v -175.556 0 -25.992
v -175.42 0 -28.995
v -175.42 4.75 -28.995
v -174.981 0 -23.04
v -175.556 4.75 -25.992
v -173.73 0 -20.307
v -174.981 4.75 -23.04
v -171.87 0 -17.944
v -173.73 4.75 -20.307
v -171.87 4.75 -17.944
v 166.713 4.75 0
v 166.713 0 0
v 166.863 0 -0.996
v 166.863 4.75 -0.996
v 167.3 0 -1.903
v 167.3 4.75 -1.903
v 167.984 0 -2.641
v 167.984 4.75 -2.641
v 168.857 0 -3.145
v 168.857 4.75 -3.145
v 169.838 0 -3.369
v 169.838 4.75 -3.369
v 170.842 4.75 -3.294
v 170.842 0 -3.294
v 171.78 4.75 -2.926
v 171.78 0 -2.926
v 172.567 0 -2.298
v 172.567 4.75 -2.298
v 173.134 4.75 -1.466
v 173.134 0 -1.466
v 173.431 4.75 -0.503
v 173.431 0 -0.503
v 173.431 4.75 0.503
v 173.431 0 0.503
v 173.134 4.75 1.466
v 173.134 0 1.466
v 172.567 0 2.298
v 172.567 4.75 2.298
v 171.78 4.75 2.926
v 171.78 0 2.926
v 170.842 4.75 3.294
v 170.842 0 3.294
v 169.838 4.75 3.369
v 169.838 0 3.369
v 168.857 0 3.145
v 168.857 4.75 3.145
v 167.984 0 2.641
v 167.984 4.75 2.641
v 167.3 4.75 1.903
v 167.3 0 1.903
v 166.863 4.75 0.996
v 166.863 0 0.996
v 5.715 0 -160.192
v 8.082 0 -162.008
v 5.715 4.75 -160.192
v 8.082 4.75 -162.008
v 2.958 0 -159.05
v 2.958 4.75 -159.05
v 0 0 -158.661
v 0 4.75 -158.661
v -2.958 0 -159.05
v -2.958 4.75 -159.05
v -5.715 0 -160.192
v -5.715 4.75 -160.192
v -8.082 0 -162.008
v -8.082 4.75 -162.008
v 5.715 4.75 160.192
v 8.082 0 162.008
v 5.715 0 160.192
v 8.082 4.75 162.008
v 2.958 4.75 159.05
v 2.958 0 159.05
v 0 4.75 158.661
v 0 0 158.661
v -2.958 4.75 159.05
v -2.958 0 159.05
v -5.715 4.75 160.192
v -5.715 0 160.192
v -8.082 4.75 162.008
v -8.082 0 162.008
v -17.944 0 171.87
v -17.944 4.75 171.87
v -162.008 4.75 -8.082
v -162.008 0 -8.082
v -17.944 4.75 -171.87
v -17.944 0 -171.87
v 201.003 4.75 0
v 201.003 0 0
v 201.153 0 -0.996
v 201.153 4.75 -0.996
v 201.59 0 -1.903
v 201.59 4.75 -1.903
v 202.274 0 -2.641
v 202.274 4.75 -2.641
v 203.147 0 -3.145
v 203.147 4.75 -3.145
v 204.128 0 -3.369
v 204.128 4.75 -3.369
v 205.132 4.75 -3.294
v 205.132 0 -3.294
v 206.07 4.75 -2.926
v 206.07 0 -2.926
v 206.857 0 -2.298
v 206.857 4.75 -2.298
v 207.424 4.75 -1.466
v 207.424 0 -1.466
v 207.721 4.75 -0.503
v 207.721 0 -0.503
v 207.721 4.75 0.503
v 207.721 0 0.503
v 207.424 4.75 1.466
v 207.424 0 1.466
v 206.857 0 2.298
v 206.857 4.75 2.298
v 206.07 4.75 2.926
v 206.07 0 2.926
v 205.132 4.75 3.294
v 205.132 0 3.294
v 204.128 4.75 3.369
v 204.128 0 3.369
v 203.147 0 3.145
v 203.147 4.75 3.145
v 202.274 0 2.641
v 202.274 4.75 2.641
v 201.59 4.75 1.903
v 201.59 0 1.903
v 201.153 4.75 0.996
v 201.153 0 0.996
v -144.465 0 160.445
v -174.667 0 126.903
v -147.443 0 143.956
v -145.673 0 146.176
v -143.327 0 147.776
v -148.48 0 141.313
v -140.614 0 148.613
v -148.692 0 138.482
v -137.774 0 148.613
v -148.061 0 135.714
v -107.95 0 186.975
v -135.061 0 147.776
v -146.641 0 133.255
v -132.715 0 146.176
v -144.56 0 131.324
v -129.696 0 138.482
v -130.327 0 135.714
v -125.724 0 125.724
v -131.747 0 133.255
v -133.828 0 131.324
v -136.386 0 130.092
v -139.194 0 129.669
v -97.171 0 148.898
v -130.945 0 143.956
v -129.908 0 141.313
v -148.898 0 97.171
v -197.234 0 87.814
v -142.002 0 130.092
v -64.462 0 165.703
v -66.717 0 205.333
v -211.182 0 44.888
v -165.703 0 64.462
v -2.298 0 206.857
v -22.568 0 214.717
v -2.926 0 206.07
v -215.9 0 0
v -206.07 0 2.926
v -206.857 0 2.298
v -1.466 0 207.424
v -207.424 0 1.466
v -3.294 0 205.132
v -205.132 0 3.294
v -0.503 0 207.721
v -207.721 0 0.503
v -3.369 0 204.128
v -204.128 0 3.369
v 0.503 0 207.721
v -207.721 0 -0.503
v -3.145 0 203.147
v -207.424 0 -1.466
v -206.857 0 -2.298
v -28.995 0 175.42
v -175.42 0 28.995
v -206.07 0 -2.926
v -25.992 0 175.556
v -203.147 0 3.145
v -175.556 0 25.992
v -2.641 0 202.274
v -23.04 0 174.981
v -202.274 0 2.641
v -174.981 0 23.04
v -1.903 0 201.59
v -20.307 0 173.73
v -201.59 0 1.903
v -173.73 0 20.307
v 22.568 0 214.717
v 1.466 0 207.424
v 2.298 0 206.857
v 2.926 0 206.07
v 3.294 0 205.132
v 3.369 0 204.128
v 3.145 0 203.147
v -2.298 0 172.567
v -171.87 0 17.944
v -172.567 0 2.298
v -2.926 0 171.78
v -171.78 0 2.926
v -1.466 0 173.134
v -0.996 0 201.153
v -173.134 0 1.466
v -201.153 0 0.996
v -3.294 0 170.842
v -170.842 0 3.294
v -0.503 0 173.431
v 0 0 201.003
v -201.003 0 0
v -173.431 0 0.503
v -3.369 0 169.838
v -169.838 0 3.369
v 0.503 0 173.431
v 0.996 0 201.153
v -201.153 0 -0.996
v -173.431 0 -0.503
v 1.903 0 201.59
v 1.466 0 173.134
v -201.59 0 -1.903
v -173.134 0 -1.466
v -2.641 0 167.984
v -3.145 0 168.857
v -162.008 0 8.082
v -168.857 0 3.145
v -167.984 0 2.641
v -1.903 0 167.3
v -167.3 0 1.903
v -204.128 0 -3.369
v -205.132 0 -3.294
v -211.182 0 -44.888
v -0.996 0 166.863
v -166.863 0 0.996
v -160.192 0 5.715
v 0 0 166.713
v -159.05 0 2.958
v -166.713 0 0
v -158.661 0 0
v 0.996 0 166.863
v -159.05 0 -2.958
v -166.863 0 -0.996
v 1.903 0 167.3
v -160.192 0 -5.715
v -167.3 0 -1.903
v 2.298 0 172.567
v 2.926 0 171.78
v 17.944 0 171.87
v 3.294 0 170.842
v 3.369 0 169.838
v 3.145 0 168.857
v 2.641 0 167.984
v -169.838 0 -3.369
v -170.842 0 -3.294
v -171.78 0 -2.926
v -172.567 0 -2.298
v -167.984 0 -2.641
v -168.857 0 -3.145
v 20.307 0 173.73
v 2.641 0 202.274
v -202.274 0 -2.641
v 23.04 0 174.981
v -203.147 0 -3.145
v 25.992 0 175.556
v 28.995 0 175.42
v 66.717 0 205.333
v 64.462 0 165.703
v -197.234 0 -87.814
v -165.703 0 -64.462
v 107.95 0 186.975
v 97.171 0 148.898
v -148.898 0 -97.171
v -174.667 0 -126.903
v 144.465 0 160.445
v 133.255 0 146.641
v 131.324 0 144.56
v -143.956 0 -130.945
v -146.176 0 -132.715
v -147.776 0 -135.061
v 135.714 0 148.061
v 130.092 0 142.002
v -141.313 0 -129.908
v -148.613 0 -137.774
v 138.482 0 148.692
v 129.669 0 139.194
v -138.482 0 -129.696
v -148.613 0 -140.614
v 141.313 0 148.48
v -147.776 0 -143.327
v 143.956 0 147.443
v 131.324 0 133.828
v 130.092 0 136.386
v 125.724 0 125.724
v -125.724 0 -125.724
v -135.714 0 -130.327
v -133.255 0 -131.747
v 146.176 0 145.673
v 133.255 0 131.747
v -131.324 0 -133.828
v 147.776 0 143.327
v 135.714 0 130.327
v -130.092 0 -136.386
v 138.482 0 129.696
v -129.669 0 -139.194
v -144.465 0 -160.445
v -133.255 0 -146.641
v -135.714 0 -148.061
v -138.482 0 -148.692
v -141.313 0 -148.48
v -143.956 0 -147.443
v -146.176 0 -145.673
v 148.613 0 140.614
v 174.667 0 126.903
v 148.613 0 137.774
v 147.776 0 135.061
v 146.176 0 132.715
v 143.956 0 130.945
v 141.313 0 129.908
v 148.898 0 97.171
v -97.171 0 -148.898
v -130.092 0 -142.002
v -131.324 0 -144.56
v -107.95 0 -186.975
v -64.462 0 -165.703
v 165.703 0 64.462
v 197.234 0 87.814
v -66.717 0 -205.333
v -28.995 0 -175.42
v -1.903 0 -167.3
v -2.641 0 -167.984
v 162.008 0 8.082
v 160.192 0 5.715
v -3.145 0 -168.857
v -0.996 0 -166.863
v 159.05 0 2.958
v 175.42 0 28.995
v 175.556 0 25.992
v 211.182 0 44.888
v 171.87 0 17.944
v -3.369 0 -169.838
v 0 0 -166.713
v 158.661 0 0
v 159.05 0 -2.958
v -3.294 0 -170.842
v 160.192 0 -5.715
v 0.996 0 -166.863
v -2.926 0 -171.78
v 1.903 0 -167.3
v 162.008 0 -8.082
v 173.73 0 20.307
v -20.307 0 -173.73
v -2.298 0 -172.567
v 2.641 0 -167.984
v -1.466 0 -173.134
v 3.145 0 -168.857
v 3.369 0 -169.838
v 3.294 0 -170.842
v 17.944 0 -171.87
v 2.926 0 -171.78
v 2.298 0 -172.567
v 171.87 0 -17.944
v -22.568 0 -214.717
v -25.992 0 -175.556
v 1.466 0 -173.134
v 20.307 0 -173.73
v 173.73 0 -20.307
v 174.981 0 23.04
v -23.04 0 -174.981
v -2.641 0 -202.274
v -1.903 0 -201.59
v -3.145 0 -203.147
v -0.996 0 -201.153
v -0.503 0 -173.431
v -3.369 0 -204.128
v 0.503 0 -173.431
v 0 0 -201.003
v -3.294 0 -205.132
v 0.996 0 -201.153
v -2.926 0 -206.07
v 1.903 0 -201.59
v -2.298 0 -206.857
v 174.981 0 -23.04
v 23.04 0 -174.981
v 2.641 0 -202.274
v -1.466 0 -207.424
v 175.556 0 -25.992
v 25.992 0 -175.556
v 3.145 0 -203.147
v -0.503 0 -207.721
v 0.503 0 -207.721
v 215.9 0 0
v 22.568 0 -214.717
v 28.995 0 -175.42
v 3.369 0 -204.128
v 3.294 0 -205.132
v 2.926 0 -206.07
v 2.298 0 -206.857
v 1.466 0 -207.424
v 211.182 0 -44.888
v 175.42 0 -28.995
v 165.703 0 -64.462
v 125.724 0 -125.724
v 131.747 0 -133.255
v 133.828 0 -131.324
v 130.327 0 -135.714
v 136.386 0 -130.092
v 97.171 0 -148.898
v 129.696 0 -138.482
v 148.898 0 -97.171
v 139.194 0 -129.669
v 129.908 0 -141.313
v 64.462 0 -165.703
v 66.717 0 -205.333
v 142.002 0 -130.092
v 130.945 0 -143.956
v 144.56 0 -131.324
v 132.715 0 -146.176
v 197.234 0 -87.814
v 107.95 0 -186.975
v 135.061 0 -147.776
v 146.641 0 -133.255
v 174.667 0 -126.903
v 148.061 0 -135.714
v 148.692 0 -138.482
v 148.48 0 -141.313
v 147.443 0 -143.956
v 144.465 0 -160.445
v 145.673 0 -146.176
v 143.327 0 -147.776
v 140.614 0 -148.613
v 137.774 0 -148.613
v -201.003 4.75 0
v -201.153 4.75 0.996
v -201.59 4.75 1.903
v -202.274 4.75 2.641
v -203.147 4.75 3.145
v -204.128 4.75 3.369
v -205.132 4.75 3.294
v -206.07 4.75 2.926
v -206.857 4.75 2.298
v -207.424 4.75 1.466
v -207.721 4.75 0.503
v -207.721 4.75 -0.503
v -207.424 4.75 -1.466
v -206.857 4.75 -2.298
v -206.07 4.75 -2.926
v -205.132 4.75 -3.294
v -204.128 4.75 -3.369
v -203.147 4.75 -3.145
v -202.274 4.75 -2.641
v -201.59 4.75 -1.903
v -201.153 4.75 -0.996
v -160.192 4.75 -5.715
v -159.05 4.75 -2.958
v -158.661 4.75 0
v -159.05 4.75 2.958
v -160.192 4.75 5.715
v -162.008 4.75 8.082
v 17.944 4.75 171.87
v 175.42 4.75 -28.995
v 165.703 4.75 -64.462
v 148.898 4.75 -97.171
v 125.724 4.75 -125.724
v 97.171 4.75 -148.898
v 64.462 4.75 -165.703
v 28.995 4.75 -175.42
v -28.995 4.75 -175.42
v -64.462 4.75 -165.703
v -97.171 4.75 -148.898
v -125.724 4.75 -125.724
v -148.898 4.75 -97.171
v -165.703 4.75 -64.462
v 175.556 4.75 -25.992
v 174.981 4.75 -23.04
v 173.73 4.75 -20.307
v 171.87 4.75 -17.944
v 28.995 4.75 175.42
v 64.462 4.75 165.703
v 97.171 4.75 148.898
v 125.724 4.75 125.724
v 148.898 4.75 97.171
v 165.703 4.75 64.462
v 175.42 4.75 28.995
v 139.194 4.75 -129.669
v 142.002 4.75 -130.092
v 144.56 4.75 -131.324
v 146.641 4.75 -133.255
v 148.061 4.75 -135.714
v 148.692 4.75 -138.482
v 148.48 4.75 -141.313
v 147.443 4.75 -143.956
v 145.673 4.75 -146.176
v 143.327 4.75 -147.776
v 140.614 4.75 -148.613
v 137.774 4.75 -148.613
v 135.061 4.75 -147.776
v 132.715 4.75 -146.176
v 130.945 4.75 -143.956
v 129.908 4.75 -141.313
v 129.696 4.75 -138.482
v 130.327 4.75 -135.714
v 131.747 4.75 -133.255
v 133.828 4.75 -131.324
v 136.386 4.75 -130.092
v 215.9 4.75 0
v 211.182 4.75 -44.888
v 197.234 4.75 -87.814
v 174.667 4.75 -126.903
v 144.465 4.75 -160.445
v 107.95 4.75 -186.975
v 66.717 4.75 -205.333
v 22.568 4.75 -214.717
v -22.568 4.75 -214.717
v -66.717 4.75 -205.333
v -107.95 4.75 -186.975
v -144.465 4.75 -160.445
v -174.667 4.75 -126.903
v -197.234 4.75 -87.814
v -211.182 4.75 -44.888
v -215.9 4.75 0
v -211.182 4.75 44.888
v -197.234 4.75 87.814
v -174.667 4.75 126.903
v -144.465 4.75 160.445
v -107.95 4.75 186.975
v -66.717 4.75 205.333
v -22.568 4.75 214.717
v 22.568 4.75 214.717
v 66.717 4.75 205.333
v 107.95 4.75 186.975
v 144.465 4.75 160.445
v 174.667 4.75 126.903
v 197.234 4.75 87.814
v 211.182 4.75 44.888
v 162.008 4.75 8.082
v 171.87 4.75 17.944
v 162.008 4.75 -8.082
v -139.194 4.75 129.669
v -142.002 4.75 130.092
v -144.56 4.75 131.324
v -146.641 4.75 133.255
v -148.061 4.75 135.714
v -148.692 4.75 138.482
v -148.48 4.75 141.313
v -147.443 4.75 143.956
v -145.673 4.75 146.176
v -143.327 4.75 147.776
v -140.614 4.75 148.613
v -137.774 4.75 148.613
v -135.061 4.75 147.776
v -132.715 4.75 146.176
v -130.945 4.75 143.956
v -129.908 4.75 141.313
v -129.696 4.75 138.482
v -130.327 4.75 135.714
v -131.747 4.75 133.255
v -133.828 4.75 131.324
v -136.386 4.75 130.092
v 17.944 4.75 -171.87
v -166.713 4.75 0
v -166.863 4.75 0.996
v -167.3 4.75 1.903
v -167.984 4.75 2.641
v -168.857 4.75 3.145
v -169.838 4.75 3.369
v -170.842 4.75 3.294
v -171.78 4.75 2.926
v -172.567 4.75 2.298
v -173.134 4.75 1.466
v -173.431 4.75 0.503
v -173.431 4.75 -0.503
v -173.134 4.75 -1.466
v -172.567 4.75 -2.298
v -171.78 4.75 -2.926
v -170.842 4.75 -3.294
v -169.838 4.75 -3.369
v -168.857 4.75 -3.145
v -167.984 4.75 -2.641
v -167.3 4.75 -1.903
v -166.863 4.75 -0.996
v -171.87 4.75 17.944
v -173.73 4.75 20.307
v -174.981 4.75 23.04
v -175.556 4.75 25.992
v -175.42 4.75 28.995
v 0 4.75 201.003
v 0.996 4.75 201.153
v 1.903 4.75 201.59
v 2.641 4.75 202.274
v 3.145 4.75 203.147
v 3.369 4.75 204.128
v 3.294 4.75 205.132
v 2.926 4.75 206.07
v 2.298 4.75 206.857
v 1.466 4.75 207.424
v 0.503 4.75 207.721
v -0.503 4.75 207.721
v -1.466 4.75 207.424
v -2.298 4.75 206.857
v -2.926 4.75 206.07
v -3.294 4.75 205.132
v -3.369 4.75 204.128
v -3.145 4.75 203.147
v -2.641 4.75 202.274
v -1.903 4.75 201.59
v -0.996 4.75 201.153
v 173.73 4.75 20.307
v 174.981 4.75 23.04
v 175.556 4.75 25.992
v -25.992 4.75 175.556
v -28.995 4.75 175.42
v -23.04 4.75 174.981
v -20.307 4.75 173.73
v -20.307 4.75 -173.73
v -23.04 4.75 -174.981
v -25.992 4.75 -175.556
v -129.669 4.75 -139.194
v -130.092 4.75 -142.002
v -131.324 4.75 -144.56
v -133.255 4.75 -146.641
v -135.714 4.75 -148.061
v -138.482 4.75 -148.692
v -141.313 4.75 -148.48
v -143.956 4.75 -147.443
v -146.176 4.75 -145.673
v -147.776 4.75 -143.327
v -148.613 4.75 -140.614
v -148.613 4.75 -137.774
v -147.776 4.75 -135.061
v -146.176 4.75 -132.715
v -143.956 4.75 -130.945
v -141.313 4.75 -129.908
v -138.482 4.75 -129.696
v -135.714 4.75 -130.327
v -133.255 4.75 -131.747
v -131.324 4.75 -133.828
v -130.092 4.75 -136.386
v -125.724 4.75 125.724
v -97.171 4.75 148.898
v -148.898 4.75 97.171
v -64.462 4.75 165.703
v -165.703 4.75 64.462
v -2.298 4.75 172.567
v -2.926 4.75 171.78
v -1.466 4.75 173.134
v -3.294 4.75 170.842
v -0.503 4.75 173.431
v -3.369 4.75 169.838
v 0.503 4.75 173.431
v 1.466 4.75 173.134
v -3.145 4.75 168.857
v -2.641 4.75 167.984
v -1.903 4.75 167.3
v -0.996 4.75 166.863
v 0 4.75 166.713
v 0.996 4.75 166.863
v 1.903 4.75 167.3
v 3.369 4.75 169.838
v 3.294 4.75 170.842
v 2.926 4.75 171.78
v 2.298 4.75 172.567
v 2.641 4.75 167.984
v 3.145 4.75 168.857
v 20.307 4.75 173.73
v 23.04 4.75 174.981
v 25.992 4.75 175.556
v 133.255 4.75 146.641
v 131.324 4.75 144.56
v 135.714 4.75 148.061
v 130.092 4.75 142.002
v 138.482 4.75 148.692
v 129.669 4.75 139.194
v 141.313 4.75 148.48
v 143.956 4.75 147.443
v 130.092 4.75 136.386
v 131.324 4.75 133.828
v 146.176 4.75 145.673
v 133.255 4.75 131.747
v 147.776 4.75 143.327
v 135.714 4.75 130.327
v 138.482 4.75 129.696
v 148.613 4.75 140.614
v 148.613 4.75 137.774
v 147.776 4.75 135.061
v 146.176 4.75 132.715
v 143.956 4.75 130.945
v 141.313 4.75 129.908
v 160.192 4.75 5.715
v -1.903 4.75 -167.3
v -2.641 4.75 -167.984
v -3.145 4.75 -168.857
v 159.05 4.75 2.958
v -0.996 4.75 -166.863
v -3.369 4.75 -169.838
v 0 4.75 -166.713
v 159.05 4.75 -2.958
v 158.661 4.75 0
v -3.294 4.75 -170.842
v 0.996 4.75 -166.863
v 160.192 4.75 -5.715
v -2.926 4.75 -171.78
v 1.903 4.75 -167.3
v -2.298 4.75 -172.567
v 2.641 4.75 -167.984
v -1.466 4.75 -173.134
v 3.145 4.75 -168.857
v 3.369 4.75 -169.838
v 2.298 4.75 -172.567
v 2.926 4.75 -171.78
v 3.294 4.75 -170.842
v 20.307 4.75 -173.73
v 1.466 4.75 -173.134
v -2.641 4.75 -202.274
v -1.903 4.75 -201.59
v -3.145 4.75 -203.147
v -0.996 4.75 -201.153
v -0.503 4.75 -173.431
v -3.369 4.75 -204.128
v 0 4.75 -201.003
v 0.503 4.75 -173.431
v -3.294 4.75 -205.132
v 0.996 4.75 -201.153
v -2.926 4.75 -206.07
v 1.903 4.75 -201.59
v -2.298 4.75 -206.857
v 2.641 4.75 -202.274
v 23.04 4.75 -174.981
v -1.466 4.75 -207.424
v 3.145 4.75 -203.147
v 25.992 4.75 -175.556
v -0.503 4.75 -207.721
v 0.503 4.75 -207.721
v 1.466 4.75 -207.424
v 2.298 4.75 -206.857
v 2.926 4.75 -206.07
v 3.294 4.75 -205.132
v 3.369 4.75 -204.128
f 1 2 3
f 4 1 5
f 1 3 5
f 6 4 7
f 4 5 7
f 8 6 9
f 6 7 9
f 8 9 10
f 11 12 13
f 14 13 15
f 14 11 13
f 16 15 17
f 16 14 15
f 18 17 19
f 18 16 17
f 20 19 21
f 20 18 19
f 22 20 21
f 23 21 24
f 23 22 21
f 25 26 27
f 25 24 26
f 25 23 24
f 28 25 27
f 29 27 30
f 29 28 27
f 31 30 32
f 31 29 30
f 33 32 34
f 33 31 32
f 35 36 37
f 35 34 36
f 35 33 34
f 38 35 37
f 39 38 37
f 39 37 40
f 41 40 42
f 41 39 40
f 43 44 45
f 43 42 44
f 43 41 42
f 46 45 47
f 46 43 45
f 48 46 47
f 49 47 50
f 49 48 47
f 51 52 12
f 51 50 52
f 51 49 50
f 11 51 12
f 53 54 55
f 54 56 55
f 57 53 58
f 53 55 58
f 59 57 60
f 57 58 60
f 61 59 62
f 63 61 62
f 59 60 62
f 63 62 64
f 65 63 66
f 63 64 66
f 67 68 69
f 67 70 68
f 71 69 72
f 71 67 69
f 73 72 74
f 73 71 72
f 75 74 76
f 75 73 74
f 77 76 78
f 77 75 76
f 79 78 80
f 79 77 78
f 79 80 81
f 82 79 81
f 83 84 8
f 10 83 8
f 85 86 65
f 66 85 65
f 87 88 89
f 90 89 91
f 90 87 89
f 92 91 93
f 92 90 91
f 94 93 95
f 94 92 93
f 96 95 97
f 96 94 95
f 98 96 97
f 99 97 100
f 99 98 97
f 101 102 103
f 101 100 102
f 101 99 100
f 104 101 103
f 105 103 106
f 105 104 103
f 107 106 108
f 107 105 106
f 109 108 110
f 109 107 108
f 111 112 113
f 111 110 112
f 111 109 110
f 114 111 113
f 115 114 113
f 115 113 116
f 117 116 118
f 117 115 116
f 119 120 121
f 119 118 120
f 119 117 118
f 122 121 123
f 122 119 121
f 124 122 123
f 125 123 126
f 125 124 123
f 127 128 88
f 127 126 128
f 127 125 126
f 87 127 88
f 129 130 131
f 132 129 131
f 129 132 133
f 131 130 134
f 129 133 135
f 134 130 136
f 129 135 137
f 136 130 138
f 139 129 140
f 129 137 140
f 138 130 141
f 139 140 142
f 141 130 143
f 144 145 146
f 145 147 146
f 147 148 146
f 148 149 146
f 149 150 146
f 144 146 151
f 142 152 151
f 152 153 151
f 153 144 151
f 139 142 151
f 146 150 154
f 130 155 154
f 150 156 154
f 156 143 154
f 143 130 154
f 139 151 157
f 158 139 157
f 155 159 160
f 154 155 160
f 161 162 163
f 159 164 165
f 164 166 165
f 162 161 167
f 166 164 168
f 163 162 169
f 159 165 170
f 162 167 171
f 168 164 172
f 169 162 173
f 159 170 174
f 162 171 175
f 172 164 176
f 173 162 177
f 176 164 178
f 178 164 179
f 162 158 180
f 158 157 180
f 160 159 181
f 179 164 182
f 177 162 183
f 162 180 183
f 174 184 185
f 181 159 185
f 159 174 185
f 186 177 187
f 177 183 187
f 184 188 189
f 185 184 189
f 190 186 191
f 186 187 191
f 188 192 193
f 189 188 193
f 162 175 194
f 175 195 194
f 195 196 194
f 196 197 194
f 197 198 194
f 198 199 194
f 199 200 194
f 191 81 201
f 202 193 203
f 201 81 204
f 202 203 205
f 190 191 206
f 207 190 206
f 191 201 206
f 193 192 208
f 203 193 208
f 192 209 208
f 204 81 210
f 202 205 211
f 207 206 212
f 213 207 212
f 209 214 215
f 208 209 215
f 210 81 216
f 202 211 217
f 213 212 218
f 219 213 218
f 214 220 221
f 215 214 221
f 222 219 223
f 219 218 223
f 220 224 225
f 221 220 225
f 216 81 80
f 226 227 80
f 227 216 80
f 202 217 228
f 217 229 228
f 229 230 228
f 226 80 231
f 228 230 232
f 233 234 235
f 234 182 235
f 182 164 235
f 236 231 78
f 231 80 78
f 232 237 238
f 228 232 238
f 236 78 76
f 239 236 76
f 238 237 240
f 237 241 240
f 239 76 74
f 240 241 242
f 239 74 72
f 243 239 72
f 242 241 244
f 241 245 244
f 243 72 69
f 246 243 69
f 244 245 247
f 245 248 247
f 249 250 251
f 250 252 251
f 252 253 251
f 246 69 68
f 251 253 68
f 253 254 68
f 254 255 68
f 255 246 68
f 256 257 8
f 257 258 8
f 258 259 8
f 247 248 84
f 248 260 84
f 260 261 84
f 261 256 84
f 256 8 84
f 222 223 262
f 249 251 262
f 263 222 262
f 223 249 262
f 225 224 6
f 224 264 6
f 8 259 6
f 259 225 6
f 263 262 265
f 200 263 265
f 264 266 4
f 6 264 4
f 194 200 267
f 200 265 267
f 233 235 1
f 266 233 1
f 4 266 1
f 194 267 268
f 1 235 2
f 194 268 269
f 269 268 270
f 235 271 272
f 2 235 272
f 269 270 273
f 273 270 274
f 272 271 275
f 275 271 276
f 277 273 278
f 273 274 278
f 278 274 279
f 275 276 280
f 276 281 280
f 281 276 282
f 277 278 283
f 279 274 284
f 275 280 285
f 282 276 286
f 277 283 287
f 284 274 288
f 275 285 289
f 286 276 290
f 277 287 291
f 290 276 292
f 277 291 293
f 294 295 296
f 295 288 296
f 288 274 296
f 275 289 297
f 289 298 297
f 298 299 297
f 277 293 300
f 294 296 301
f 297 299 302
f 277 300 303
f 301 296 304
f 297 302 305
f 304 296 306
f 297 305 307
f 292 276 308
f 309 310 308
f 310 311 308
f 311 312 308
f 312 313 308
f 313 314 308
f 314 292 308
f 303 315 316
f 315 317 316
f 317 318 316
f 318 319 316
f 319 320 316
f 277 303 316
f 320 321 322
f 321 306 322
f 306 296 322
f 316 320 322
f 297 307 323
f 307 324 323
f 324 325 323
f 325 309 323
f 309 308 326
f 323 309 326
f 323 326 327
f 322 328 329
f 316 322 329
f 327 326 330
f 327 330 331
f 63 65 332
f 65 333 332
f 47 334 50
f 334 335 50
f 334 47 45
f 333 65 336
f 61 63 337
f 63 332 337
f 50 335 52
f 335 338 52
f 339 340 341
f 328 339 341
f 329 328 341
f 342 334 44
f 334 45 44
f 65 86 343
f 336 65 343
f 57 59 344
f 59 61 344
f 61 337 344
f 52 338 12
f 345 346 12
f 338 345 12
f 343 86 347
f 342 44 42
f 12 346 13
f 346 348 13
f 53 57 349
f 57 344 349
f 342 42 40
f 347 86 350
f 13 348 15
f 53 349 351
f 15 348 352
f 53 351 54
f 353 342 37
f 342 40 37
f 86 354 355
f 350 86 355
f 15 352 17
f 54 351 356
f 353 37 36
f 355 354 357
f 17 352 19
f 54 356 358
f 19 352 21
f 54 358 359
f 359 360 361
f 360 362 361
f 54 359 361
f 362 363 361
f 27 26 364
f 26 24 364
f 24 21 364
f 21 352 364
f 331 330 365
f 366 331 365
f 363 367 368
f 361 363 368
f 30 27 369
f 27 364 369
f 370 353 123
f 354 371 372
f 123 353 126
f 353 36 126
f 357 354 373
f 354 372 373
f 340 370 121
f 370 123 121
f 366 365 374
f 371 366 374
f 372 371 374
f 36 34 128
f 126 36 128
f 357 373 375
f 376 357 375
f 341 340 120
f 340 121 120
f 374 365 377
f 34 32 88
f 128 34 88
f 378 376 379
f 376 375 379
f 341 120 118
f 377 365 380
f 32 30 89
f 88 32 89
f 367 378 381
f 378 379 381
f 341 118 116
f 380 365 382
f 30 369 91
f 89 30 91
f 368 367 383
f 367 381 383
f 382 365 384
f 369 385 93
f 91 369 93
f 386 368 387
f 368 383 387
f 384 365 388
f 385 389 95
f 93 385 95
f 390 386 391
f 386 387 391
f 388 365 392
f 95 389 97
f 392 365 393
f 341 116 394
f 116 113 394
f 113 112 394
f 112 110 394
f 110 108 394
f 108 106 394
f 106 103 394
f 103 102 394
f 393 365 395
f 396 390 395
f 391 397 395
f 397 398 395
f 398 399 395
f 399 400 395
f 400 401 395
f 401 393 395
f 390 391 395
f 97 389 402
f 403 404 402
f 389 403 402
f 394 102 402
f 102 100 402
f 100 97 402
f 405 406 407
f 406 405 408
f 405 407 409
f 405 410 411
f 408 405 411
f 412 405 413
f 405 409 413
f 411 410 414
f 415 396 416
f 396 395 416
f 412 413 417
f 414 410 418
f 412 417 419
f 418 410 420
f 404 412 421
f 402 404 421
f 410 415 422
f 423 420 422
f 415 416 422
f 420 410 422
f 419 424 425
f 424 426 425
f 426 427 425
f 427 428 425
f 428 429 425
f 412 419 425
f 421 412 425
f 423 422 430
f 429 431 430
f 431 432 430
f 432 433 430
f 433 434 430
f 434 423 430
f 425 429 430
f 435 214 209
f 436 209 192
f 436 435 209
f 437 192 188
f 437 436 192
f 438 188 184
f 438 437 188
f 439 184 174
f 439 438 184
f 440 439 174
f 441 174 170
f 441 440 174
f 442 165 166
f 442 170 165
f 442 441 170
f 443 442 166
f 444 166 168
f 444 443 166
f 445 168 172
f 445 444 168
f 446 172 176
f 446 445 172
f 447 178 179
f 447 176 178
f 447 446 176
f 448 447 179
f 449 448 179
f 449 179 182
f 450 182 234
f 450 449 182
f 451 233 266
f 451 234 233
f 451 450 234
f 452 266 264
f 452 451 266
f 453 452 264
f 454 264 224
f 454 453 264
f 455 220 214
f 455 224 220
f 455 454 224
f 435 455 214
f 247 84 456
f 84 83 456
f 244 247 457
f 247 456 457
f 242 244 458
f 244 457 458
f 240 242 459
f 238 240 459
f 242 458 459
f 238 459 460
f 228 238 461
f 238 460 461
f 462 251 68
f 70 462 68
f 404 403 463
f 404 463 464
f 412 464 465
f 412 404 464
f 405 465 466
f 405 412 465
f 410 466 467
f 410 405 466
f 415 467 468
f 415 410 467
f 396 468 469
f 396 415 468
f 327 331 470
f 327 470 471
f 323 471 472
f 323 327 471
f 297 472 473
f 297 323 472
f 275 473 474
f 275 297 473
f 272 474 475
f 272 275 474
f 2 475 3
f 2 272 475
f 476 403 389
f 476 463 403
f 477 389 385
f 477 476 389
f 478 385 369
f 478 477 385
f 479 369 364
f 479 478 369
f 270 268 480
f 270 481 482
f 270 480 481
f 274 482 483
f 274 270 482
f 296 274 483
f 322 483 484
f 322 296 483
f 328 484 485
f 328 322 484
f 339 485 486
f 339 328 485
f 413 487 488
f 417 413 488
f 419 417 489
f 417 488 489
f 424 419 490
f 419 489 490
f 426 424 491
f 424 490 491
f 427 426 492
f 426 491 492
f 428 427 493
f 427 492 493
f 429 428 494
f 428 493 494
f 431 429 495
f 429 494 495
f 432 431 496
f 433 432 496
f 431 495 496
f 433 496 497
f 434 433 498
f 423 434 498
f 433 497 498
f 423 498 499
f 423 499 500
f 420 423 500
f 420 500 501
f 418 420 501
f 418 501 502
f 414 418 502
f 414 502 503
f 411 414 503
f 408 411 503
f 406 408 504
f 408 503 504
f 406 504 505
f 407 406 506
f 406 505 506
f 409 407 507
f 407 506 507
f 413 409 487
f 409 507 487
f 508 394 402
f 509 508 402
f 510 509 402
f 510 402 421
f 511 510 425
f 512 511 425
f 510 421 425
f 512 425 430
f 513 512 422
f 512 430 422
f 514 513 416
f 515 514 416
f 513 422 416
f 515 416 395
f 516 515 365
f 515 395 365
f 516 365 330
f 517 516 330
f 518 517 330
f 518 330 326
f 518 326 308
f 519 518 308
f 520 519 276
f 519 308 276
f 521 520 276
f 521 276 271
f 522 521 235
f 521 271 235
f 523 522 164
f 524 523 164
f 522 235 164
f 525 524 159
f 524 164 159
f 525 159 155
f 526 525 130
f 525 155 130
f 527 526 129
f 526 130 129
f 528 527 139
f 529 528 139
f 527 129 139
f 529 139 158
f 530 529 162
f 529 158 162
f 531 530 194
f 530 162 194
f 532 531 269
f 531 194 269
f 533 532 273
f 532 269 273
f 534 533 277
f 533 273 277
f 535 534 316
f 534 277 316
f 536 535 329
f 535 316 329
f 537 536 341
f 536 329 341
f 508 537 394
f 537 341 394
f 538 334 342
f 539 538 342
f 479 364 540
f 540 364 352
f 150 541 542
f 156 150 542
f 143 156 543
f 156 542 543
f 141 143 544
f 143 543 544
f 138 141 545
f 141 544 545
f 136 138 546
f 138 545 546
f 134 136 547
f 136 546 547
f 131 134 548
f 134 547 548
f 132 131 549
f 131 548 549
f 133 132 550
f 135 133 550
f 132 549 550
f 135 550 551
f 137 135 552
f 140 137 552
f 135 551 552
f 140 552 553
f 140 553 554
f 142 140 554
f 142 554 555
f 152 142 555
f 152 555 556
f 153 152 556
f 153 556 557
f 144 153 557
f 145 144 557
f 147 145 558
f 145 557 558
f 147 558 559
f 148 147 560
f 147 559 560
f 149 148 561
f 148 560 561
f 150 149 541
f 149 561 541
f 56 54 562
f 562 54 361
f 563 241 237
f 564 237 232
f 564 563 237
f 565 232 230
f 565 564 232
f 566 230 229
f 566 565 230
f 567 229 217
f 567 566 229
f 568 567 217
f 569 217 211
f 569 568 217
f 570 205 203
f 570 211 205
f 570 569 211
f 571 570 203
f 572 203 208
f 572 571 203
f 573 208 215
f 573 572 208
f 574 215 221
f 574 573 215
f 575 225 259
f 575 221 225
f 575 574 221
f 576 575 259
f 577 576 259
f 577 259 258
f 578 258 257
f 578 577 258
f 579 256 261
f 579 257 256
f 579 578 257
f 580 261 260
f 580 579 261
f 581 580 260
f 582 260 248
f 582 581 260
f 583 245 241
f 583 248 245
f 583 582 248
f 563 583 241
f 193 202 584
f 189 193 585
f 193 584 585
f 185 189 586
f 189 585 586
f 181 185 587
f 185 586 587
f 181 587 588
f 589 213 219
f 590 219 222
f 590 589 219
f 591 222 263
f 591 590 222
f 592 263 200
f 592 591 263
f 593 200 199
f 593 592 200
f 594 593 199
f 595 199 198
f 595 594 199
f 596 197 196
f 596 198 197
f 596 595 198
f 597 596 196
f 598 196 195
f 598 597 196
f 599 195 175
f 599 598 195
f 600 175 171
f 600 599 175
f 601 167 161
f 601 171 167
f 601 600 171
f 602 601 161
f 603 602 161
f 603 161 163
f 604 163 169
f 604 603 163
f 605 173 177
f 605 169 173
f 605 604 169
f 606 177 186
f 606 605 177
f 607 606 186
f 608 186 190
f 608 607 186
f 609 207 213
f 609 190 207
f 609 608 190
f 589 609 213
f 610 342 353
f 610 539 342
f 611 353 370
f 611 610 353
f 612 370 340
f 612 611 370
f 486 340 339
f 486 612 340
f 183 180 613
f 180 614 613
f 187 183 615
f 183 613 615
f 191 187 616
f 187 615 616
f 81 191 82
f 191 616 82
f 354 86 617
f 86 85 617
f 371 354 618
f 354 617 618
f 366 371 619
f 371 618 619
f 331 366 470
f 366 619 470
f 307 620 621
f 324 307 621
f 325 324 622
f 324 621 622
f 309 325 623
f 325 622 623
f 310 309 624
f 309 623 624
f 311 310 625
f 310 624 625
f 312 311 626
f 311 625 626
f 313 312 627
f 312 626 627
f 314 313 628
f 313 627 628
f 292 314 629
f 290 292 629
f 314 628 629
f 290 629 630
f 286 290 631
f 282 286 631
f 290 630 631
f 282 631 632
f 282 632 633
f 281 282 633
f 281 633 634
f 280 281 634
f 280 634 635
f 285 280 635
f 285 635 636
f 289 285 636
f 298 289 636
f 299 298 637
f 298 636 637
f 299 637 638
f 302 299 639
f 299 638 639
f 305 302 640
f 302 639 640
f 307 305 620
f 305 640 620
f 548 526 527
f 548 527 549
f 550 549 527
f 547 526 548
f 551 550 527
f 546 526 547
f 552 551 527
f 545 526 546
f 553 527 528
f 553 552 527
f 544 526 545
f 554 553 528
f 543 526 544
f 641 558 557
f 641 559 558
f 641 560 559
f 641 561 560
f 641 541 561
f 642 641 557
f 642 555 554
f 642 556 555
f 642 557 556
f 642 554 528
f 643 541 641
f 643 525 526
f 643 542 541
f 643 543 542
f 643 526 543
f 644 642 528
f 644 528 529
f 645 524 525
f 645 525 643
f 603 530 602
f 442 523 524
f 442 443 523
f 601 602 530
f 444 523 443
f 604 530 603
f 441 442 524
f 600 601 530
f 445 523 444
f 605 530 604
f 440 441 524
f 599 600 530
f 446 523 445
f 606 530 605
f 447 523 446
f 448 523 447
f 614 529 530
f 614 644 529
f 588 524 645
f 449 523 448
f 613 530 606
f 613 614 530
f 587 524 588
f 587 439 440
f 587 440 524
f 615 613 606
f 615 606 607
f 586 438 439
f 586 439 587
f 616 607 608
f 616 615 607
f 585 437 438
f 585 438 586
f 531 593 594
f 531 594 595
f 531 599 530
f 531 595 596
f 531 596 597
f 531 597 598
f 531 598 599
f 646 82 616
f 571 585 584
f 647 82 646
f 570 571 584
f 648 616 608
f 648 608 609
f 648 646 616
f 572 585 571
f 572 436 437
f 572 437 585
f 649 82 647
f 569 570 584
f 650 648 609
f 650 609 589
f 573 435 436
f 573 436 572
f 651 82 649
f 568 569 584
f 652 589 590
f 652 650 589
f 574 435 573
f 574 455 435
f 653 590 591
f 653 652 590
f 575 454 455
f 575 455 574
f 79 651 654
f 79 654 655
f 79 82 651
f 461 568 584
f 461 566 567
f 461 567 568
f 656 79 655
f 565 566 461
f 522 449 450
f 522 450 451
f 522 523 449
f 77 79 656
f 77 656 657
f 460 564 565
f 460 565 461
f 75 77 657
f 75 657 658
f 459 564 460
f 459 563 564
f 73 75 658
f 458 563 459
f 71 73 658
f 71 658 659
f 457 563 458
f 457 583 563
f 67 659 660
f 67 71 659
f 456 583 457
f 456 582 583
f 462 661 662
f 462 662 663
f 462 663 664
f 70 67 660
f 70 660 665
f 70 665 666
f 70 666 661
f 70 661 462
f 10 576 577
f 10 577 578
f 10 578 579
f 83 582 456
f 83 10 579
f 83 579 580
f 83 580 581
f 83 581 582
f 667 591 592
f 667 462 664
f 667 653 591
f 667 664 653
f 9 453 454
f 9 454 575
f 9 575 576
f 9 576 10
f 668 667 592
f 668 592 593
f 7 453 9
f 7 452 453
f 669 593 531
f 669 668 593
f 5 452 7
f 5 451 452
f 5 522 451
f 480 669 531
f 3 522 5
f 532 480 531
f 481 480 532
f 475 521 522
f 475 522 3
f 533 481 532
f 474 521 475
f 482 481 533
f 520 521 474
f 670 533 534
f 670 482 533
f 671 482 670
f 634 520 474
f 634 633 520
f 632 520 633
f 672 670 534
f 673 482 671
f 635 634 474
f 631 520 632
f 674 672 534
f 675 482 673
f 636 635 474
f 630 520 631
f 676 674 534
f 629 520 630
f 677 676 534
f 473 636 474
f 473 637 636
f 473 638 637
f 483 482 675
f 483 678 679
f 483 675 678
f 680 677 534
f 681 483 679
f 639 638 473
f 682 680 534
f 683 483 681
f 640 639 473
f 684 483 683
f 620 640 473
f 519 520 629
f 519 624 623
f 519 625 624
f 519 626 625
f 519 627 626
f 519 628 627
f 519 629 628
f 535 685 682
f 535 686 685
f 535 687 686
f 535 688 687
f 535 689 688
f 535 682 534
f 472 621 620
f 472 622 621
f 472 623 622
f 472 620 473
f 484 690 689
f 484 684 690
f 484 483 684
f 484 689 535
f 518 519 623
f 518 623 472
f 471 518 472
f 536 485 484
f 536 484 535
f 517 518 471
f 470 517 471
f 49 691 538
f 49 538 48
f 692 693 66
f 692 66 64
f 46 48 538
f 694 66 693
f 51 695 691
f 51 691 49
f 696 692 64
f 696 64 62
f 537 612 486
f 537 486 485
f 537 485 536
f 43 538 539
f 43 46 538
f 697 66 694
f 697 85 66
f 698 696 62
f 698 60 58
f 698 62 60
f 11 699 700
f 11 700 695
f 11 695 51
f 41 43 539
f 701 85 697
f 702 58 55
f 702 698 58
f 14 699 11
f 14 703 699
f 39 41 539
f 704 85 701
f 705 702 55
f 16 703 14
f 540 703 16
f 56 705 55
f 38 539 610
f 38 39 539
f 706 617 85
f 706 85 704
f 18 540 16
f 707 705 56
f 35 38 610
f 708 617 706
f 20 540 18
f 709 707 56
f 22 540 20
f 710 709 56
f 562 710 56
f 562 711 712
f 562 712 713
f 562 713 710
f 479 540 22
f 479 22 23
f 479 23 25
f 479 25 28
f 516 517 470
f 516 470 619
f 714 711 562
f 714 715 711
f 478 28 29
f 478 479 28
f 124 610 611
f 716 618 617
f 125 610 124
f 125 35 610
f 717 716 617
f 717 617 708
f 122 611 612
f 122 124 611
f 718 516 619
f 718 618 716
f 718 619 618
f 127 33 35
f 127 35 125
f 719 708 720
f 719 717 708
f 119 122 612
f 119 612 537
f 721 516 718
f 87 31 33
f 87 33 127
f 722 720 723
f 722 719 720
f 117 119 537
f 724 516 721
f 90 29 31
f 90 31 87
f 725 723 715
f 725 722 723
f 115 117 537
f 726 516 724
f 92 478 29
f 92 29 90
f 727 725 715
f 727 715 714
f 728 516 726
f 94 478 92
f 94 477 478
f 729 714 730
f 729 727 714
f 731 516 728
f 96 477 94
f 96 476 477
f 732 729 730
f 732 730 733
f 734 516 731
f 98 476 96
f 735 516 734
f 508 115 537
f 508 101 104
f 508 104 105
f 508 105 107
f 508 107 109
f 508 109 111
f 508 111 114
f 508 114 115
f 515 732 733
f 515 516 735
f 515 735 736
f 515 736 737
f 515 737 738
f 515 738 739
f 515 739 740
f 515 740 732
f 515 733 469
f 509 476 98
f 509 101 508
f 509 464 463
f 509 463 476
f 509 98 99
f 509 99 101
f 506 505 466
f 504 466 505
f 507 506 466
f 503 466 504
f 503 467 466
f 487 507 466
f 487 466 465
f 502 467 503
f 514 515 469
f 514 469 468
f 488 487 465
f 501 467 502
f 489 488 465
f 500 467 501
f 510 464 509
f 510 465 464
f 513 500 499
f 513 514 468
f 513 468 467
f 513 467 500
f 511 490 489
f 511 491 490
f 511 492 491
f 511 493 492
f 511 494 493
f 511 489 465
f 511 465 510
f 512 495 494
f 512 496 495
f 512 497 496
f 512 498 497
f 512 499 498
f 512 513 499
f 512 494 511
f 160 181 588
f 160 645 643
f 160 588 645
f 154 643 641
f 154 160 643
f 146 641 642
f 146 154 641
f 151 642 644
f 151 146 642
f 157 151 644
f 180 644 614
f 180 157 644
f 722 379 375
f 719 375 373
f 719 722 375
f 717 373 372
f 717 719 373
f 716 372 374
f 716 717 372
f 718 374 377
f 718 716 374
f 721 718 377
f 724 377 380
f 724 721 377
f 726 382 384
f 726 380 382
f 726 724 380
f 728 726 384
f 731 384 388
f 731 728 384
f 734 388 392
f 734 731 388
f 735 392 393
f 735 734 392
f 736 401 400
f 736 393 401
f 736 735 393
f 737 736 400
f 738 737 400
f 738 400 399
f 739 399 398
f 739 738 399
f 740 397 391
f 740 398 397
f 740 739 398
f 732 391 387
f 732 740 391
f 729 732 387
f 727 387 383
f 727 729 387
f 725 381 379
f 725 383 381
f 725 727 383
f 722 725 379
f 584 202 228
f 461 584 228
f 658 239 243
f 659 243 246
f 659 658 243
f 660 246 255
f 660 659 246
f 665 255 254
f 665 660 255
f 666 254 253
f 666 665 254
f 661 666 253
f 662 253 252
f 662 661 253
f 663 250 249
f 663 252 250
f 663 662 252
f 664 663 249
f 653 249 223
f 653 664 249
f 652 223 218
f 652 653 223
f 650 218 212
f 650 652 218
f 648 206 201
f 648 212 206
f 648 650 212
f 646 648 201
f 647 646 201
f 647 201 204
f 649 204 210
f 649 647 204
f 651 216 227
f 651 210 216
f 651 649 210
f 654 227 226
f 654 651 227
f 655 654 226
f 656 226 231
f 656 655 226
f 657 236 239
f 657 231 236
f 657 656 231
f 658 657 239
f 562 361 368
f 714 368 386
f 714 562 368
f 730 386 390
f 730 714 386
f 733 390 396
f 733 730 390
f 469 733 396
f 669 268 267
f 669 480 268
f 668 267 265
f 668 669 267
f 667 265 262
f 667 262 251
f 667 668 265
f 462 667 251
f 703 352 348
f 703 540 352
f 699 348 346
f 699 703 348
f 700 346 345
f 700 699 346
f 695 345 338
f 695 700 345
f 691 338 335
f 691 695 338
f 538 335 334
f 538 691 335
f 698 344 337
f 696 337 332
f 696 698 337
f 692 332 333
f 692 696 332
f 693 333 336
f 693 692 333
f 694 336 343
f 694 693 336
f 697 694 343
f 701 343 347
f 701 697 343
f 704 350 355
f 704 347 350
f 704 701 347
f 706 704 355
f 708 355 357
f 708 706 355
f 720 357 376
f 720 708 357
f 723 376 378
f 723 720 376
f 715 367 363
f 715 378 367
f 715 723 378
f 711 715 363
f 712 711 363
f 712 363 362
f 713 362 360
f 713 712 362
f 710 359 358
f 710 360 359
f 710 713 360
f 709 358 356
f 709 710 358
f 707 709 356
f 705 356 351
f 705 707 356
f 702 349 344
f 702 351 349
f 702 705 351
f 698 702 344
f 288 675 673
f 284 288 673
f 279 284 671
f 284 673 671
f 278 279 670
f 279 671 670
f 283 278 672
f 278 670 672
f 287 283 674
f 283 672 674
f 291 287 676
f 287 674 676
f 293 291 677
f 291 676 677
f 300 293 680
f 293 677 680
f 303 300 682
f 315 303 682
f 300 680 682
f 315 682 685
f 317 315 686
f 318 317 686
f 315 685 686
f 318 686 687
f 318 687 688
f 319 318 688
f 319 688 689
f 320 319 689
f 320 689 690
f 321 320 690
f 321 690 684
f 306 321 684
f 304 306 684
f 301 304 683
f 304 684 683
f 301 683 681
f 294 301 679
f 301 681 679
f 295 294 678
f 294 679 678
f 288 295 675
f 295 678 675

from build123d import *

# Parameters (mm, degrees)
SKETCH1_R                        = 215.9
SKETCH1_R_2                      = 177.8
BOSS_EXTRUDE1_DEPTH              = 4.7498
BOSS_EXTRUDE2_DEPTH              = 4.7498
FILLET2_R                        = 12.7
FILLET3_R                        = 11.43
F_1_4_CLEARANCE_HOLE1_AT_2_COUNT = 2
F_1_4_CLEARANCE_HOLE1_AT_2_PITCH = 34.29
CIRPATTERN1_COUNT                = 4
FILLET2_OF_CIRPATTERN1_R         = 12.7
FILLET3_OF_CIRPATTERN1_R         = 11.43
SKETCH6_R                        = 9.525
CUT_EXTRUDE1_DEPTH               = 4.7498
CIRPATTERN2_COUNT                = 4


with BuildPart() as part:
    # Sketch1 → Boss-Extrude1 (new body)
    with BuildSketch(Plane(origin=(0, 0, 0), x_dir=(1, 0, 0), z_dir=(0, 1, 0))):
        Circle(SKETCH1_R)
        Circle(SKETCH1_R_2, mode=Mode.SUBTRACT)
    extrude(amount=BOSS_EXTRUDE1_DEPTH)

    # Sketch3 → Boss-Extrude2 (add)
    with BuildSketch(Plane(origin=(0, 0, 0), x_dir=(1, 0, 0), z_dir=(0, 1, 0))):
        with BuildLine():
            Line((-22.450640303, 176.376894037), (0, 153.926253734))
            Line((0, 153.926253734), (22.450640303, 176.376894037))
            ThreePointArc((22.450640303, 176.376894037), (0, 177.8), (-22.450640303, 176.376894037))
        make_face()
    boss_extrude2 = extrude(amount=BOSS_EXTRUDE2_DEPTH)

    # Fillet2
    fillet2_edges = [part.edges().sort_by_distance(p)[0] for p in [
        (22.450640303, 2.3749, -176.376894037),
        (-22.450640303, 2.3749, -176.376894037),
    ]]
    fillet(fillet2_edges, radius=FILLET2_R)

    # Fillet3
    fillet3_edges = [part.edges().sort_by_distance(p)[0] for p in [
        (0, 2.3749, -153.926253734),
    ]]
    fillet(fillet3_edges, radius=FILLET3_R)

    # Sketch5 → 1/4 Clearance Hole1 (revolve, cut)
    with BuildSketch(Plane(origin=(0, 4.7498, -170.090714752), x_dir=(0, 0, 1), z_dir=(1, 0, 0))):
        Polygon((0, 0), (0, 12.189827343), (3.3782, 10.16), (3.3782, 0), align=None)
    f_1_4_clearance_hole1 = revolve(axis=Axis((0, 11.0998, -170.090714752), (0, -1, 0)), mode=Mode.SUBTRACT)

    # 1/4 Clearance Hole1 at 2: 1/4 Clearance Hole1 ×2
    with Locations(*[(0, 0, -i * F_1_4_CLEARANCE_HOLE1_AT_2_PITCH) for i in range(1, F_1_4_CLEARANCE_HOLE1_AT_2_COUNT)]):
        add(f_1_4_clearance_hole1, mode=Mode.SUBTRACT)

    # CirPattern1: Boss-Extrude2, 1/4 Clearance Hole1 ×4 about axis
    cirpattern1_axis = Axis((0, 0, 0), (0, 1, 0))
    for i in range(1, CIRPATTERN1_COUNT):
        add(boss_extrude2.rotate(cirpattern1_axis, i * 360 / CIRPATTERN1_COUNT))
        add(f_1_4_clearance_hole1.rotate(cirpattern1_axis, i * 360 / CIRPATTERN1_COUNT), mode=Mode.SUBTRACT)

    # CirPattern1 copy 1 sketch → CirPattern1 copy 1 (revolve, cut)
    with BuildSketch(Plane(origin=(-204.380714752, 4.7498, 0), x_dir=(1, 0, 0), z_dir=(0, 0, -1))):
        Polygon((0, 0), (0, 12.189827343), (3.3782, 10.16), (3.3782, 0), align=None)
    revolve(axis=Axis((-204.380714752, 11.0998, 0), (0, -1, 0)), mode=Mode.SUBTRACT)

    # CirPattern1 copy 2 sketch → CirPattern1 copy 2 (revolve, cut)
    with BuildSketch(Plane(origin=(0, 4.7498, 204.380714752), x_dir=(0, 0, -1), z_dir=(-1, 0, 0))):
        Polygon((0, 0), (0, 12.189827343), (3.3782, 10.16), (3.3782, 0), align=None)
    revolve(axis=Axis((0, 11.0998, 204.380714752), (0, -1, 0)), mode=Mode.SUBTRACT)

    # CirPattern1 copy 3 sketch → CirPattern1 copy 3 (revolve, cut)
    with BuildSketch(Plane(origin=(204.380714752, 4.7498, 0), x_dir=(-1, 0, 0), z_dir=(0, 0, 1))):
        Polygon((0, 0), (0, 12.189827343), (3.3782, 10.16), (3.3782, 0), align=None)
    revolve(axis=Axis((204.380714752, 11.0998, 0), (0, -1, 0)), mode=Mode.SUBTRACT)

    # Fillet2 of CirPattern1
    fillet2_of_cirpattern1_edges = [part.edges().sort_by_distance(p)[0] for p in [
        (-176.376894037, 2.3749, -22.450640303),
        (-176.376894037, 2.3749, 22.450640303),
        (-22.450640303, 2.3749, 176.376894037),
        (22.450640303, 2.3749, 176.376894037),
        (176.376894037, 2.3749, 22.450640303),
        (176.376894037, 2.3749, -22.450640303),
    ]]
    fillet(fillet2_of_cirpattern1_edges, radius=FILLET2_OF_CIRPATTERN1_R)

    # Fillet3 of CirPattern1
    fillet3_of_cirpattern1_edges = [part.edges().sort_by_distance(p)[0] for p in [
        (-153.926253734, 2.3749, 0),
        (0, 2.3749, 153.926253734),
        (153.926253734, 2.3749, 0),
    ]]
    fillet(fillet3_of_cirpattern1_edges, radius=FILLET3_OF_CIRPATTERN1_R)

    # Sketch6 → Cut-Extrude1 (cut)
    with BuildSketch(Plane(origin=(0, 4.7498, 0), x_dir=(1, 0, 0), z_dir=(0, 1, 0))):
        with Locations((-139.193969877, 139.193969877)):
            Circle(SKETCH6_R)
    cut_extrude1 = extrude(amount=-CUT_EXTRUDE1_DEPTH, mode=Mode.SUBTRACT)

    # CirPattern2: Cut-Extrude1 ×4 about axis
    cirpattern2_axis = Axis((0, 0, 0), (0, 1, 0))
    for i in range(1, CIRPATTERN2_COUNT):
        add(cut_extrude1.rotate(cirpattern2_axis, i * 360 / CIRPATTERN2_COUNT), mode=Mode.SUBTRACT)


solid = part.part
